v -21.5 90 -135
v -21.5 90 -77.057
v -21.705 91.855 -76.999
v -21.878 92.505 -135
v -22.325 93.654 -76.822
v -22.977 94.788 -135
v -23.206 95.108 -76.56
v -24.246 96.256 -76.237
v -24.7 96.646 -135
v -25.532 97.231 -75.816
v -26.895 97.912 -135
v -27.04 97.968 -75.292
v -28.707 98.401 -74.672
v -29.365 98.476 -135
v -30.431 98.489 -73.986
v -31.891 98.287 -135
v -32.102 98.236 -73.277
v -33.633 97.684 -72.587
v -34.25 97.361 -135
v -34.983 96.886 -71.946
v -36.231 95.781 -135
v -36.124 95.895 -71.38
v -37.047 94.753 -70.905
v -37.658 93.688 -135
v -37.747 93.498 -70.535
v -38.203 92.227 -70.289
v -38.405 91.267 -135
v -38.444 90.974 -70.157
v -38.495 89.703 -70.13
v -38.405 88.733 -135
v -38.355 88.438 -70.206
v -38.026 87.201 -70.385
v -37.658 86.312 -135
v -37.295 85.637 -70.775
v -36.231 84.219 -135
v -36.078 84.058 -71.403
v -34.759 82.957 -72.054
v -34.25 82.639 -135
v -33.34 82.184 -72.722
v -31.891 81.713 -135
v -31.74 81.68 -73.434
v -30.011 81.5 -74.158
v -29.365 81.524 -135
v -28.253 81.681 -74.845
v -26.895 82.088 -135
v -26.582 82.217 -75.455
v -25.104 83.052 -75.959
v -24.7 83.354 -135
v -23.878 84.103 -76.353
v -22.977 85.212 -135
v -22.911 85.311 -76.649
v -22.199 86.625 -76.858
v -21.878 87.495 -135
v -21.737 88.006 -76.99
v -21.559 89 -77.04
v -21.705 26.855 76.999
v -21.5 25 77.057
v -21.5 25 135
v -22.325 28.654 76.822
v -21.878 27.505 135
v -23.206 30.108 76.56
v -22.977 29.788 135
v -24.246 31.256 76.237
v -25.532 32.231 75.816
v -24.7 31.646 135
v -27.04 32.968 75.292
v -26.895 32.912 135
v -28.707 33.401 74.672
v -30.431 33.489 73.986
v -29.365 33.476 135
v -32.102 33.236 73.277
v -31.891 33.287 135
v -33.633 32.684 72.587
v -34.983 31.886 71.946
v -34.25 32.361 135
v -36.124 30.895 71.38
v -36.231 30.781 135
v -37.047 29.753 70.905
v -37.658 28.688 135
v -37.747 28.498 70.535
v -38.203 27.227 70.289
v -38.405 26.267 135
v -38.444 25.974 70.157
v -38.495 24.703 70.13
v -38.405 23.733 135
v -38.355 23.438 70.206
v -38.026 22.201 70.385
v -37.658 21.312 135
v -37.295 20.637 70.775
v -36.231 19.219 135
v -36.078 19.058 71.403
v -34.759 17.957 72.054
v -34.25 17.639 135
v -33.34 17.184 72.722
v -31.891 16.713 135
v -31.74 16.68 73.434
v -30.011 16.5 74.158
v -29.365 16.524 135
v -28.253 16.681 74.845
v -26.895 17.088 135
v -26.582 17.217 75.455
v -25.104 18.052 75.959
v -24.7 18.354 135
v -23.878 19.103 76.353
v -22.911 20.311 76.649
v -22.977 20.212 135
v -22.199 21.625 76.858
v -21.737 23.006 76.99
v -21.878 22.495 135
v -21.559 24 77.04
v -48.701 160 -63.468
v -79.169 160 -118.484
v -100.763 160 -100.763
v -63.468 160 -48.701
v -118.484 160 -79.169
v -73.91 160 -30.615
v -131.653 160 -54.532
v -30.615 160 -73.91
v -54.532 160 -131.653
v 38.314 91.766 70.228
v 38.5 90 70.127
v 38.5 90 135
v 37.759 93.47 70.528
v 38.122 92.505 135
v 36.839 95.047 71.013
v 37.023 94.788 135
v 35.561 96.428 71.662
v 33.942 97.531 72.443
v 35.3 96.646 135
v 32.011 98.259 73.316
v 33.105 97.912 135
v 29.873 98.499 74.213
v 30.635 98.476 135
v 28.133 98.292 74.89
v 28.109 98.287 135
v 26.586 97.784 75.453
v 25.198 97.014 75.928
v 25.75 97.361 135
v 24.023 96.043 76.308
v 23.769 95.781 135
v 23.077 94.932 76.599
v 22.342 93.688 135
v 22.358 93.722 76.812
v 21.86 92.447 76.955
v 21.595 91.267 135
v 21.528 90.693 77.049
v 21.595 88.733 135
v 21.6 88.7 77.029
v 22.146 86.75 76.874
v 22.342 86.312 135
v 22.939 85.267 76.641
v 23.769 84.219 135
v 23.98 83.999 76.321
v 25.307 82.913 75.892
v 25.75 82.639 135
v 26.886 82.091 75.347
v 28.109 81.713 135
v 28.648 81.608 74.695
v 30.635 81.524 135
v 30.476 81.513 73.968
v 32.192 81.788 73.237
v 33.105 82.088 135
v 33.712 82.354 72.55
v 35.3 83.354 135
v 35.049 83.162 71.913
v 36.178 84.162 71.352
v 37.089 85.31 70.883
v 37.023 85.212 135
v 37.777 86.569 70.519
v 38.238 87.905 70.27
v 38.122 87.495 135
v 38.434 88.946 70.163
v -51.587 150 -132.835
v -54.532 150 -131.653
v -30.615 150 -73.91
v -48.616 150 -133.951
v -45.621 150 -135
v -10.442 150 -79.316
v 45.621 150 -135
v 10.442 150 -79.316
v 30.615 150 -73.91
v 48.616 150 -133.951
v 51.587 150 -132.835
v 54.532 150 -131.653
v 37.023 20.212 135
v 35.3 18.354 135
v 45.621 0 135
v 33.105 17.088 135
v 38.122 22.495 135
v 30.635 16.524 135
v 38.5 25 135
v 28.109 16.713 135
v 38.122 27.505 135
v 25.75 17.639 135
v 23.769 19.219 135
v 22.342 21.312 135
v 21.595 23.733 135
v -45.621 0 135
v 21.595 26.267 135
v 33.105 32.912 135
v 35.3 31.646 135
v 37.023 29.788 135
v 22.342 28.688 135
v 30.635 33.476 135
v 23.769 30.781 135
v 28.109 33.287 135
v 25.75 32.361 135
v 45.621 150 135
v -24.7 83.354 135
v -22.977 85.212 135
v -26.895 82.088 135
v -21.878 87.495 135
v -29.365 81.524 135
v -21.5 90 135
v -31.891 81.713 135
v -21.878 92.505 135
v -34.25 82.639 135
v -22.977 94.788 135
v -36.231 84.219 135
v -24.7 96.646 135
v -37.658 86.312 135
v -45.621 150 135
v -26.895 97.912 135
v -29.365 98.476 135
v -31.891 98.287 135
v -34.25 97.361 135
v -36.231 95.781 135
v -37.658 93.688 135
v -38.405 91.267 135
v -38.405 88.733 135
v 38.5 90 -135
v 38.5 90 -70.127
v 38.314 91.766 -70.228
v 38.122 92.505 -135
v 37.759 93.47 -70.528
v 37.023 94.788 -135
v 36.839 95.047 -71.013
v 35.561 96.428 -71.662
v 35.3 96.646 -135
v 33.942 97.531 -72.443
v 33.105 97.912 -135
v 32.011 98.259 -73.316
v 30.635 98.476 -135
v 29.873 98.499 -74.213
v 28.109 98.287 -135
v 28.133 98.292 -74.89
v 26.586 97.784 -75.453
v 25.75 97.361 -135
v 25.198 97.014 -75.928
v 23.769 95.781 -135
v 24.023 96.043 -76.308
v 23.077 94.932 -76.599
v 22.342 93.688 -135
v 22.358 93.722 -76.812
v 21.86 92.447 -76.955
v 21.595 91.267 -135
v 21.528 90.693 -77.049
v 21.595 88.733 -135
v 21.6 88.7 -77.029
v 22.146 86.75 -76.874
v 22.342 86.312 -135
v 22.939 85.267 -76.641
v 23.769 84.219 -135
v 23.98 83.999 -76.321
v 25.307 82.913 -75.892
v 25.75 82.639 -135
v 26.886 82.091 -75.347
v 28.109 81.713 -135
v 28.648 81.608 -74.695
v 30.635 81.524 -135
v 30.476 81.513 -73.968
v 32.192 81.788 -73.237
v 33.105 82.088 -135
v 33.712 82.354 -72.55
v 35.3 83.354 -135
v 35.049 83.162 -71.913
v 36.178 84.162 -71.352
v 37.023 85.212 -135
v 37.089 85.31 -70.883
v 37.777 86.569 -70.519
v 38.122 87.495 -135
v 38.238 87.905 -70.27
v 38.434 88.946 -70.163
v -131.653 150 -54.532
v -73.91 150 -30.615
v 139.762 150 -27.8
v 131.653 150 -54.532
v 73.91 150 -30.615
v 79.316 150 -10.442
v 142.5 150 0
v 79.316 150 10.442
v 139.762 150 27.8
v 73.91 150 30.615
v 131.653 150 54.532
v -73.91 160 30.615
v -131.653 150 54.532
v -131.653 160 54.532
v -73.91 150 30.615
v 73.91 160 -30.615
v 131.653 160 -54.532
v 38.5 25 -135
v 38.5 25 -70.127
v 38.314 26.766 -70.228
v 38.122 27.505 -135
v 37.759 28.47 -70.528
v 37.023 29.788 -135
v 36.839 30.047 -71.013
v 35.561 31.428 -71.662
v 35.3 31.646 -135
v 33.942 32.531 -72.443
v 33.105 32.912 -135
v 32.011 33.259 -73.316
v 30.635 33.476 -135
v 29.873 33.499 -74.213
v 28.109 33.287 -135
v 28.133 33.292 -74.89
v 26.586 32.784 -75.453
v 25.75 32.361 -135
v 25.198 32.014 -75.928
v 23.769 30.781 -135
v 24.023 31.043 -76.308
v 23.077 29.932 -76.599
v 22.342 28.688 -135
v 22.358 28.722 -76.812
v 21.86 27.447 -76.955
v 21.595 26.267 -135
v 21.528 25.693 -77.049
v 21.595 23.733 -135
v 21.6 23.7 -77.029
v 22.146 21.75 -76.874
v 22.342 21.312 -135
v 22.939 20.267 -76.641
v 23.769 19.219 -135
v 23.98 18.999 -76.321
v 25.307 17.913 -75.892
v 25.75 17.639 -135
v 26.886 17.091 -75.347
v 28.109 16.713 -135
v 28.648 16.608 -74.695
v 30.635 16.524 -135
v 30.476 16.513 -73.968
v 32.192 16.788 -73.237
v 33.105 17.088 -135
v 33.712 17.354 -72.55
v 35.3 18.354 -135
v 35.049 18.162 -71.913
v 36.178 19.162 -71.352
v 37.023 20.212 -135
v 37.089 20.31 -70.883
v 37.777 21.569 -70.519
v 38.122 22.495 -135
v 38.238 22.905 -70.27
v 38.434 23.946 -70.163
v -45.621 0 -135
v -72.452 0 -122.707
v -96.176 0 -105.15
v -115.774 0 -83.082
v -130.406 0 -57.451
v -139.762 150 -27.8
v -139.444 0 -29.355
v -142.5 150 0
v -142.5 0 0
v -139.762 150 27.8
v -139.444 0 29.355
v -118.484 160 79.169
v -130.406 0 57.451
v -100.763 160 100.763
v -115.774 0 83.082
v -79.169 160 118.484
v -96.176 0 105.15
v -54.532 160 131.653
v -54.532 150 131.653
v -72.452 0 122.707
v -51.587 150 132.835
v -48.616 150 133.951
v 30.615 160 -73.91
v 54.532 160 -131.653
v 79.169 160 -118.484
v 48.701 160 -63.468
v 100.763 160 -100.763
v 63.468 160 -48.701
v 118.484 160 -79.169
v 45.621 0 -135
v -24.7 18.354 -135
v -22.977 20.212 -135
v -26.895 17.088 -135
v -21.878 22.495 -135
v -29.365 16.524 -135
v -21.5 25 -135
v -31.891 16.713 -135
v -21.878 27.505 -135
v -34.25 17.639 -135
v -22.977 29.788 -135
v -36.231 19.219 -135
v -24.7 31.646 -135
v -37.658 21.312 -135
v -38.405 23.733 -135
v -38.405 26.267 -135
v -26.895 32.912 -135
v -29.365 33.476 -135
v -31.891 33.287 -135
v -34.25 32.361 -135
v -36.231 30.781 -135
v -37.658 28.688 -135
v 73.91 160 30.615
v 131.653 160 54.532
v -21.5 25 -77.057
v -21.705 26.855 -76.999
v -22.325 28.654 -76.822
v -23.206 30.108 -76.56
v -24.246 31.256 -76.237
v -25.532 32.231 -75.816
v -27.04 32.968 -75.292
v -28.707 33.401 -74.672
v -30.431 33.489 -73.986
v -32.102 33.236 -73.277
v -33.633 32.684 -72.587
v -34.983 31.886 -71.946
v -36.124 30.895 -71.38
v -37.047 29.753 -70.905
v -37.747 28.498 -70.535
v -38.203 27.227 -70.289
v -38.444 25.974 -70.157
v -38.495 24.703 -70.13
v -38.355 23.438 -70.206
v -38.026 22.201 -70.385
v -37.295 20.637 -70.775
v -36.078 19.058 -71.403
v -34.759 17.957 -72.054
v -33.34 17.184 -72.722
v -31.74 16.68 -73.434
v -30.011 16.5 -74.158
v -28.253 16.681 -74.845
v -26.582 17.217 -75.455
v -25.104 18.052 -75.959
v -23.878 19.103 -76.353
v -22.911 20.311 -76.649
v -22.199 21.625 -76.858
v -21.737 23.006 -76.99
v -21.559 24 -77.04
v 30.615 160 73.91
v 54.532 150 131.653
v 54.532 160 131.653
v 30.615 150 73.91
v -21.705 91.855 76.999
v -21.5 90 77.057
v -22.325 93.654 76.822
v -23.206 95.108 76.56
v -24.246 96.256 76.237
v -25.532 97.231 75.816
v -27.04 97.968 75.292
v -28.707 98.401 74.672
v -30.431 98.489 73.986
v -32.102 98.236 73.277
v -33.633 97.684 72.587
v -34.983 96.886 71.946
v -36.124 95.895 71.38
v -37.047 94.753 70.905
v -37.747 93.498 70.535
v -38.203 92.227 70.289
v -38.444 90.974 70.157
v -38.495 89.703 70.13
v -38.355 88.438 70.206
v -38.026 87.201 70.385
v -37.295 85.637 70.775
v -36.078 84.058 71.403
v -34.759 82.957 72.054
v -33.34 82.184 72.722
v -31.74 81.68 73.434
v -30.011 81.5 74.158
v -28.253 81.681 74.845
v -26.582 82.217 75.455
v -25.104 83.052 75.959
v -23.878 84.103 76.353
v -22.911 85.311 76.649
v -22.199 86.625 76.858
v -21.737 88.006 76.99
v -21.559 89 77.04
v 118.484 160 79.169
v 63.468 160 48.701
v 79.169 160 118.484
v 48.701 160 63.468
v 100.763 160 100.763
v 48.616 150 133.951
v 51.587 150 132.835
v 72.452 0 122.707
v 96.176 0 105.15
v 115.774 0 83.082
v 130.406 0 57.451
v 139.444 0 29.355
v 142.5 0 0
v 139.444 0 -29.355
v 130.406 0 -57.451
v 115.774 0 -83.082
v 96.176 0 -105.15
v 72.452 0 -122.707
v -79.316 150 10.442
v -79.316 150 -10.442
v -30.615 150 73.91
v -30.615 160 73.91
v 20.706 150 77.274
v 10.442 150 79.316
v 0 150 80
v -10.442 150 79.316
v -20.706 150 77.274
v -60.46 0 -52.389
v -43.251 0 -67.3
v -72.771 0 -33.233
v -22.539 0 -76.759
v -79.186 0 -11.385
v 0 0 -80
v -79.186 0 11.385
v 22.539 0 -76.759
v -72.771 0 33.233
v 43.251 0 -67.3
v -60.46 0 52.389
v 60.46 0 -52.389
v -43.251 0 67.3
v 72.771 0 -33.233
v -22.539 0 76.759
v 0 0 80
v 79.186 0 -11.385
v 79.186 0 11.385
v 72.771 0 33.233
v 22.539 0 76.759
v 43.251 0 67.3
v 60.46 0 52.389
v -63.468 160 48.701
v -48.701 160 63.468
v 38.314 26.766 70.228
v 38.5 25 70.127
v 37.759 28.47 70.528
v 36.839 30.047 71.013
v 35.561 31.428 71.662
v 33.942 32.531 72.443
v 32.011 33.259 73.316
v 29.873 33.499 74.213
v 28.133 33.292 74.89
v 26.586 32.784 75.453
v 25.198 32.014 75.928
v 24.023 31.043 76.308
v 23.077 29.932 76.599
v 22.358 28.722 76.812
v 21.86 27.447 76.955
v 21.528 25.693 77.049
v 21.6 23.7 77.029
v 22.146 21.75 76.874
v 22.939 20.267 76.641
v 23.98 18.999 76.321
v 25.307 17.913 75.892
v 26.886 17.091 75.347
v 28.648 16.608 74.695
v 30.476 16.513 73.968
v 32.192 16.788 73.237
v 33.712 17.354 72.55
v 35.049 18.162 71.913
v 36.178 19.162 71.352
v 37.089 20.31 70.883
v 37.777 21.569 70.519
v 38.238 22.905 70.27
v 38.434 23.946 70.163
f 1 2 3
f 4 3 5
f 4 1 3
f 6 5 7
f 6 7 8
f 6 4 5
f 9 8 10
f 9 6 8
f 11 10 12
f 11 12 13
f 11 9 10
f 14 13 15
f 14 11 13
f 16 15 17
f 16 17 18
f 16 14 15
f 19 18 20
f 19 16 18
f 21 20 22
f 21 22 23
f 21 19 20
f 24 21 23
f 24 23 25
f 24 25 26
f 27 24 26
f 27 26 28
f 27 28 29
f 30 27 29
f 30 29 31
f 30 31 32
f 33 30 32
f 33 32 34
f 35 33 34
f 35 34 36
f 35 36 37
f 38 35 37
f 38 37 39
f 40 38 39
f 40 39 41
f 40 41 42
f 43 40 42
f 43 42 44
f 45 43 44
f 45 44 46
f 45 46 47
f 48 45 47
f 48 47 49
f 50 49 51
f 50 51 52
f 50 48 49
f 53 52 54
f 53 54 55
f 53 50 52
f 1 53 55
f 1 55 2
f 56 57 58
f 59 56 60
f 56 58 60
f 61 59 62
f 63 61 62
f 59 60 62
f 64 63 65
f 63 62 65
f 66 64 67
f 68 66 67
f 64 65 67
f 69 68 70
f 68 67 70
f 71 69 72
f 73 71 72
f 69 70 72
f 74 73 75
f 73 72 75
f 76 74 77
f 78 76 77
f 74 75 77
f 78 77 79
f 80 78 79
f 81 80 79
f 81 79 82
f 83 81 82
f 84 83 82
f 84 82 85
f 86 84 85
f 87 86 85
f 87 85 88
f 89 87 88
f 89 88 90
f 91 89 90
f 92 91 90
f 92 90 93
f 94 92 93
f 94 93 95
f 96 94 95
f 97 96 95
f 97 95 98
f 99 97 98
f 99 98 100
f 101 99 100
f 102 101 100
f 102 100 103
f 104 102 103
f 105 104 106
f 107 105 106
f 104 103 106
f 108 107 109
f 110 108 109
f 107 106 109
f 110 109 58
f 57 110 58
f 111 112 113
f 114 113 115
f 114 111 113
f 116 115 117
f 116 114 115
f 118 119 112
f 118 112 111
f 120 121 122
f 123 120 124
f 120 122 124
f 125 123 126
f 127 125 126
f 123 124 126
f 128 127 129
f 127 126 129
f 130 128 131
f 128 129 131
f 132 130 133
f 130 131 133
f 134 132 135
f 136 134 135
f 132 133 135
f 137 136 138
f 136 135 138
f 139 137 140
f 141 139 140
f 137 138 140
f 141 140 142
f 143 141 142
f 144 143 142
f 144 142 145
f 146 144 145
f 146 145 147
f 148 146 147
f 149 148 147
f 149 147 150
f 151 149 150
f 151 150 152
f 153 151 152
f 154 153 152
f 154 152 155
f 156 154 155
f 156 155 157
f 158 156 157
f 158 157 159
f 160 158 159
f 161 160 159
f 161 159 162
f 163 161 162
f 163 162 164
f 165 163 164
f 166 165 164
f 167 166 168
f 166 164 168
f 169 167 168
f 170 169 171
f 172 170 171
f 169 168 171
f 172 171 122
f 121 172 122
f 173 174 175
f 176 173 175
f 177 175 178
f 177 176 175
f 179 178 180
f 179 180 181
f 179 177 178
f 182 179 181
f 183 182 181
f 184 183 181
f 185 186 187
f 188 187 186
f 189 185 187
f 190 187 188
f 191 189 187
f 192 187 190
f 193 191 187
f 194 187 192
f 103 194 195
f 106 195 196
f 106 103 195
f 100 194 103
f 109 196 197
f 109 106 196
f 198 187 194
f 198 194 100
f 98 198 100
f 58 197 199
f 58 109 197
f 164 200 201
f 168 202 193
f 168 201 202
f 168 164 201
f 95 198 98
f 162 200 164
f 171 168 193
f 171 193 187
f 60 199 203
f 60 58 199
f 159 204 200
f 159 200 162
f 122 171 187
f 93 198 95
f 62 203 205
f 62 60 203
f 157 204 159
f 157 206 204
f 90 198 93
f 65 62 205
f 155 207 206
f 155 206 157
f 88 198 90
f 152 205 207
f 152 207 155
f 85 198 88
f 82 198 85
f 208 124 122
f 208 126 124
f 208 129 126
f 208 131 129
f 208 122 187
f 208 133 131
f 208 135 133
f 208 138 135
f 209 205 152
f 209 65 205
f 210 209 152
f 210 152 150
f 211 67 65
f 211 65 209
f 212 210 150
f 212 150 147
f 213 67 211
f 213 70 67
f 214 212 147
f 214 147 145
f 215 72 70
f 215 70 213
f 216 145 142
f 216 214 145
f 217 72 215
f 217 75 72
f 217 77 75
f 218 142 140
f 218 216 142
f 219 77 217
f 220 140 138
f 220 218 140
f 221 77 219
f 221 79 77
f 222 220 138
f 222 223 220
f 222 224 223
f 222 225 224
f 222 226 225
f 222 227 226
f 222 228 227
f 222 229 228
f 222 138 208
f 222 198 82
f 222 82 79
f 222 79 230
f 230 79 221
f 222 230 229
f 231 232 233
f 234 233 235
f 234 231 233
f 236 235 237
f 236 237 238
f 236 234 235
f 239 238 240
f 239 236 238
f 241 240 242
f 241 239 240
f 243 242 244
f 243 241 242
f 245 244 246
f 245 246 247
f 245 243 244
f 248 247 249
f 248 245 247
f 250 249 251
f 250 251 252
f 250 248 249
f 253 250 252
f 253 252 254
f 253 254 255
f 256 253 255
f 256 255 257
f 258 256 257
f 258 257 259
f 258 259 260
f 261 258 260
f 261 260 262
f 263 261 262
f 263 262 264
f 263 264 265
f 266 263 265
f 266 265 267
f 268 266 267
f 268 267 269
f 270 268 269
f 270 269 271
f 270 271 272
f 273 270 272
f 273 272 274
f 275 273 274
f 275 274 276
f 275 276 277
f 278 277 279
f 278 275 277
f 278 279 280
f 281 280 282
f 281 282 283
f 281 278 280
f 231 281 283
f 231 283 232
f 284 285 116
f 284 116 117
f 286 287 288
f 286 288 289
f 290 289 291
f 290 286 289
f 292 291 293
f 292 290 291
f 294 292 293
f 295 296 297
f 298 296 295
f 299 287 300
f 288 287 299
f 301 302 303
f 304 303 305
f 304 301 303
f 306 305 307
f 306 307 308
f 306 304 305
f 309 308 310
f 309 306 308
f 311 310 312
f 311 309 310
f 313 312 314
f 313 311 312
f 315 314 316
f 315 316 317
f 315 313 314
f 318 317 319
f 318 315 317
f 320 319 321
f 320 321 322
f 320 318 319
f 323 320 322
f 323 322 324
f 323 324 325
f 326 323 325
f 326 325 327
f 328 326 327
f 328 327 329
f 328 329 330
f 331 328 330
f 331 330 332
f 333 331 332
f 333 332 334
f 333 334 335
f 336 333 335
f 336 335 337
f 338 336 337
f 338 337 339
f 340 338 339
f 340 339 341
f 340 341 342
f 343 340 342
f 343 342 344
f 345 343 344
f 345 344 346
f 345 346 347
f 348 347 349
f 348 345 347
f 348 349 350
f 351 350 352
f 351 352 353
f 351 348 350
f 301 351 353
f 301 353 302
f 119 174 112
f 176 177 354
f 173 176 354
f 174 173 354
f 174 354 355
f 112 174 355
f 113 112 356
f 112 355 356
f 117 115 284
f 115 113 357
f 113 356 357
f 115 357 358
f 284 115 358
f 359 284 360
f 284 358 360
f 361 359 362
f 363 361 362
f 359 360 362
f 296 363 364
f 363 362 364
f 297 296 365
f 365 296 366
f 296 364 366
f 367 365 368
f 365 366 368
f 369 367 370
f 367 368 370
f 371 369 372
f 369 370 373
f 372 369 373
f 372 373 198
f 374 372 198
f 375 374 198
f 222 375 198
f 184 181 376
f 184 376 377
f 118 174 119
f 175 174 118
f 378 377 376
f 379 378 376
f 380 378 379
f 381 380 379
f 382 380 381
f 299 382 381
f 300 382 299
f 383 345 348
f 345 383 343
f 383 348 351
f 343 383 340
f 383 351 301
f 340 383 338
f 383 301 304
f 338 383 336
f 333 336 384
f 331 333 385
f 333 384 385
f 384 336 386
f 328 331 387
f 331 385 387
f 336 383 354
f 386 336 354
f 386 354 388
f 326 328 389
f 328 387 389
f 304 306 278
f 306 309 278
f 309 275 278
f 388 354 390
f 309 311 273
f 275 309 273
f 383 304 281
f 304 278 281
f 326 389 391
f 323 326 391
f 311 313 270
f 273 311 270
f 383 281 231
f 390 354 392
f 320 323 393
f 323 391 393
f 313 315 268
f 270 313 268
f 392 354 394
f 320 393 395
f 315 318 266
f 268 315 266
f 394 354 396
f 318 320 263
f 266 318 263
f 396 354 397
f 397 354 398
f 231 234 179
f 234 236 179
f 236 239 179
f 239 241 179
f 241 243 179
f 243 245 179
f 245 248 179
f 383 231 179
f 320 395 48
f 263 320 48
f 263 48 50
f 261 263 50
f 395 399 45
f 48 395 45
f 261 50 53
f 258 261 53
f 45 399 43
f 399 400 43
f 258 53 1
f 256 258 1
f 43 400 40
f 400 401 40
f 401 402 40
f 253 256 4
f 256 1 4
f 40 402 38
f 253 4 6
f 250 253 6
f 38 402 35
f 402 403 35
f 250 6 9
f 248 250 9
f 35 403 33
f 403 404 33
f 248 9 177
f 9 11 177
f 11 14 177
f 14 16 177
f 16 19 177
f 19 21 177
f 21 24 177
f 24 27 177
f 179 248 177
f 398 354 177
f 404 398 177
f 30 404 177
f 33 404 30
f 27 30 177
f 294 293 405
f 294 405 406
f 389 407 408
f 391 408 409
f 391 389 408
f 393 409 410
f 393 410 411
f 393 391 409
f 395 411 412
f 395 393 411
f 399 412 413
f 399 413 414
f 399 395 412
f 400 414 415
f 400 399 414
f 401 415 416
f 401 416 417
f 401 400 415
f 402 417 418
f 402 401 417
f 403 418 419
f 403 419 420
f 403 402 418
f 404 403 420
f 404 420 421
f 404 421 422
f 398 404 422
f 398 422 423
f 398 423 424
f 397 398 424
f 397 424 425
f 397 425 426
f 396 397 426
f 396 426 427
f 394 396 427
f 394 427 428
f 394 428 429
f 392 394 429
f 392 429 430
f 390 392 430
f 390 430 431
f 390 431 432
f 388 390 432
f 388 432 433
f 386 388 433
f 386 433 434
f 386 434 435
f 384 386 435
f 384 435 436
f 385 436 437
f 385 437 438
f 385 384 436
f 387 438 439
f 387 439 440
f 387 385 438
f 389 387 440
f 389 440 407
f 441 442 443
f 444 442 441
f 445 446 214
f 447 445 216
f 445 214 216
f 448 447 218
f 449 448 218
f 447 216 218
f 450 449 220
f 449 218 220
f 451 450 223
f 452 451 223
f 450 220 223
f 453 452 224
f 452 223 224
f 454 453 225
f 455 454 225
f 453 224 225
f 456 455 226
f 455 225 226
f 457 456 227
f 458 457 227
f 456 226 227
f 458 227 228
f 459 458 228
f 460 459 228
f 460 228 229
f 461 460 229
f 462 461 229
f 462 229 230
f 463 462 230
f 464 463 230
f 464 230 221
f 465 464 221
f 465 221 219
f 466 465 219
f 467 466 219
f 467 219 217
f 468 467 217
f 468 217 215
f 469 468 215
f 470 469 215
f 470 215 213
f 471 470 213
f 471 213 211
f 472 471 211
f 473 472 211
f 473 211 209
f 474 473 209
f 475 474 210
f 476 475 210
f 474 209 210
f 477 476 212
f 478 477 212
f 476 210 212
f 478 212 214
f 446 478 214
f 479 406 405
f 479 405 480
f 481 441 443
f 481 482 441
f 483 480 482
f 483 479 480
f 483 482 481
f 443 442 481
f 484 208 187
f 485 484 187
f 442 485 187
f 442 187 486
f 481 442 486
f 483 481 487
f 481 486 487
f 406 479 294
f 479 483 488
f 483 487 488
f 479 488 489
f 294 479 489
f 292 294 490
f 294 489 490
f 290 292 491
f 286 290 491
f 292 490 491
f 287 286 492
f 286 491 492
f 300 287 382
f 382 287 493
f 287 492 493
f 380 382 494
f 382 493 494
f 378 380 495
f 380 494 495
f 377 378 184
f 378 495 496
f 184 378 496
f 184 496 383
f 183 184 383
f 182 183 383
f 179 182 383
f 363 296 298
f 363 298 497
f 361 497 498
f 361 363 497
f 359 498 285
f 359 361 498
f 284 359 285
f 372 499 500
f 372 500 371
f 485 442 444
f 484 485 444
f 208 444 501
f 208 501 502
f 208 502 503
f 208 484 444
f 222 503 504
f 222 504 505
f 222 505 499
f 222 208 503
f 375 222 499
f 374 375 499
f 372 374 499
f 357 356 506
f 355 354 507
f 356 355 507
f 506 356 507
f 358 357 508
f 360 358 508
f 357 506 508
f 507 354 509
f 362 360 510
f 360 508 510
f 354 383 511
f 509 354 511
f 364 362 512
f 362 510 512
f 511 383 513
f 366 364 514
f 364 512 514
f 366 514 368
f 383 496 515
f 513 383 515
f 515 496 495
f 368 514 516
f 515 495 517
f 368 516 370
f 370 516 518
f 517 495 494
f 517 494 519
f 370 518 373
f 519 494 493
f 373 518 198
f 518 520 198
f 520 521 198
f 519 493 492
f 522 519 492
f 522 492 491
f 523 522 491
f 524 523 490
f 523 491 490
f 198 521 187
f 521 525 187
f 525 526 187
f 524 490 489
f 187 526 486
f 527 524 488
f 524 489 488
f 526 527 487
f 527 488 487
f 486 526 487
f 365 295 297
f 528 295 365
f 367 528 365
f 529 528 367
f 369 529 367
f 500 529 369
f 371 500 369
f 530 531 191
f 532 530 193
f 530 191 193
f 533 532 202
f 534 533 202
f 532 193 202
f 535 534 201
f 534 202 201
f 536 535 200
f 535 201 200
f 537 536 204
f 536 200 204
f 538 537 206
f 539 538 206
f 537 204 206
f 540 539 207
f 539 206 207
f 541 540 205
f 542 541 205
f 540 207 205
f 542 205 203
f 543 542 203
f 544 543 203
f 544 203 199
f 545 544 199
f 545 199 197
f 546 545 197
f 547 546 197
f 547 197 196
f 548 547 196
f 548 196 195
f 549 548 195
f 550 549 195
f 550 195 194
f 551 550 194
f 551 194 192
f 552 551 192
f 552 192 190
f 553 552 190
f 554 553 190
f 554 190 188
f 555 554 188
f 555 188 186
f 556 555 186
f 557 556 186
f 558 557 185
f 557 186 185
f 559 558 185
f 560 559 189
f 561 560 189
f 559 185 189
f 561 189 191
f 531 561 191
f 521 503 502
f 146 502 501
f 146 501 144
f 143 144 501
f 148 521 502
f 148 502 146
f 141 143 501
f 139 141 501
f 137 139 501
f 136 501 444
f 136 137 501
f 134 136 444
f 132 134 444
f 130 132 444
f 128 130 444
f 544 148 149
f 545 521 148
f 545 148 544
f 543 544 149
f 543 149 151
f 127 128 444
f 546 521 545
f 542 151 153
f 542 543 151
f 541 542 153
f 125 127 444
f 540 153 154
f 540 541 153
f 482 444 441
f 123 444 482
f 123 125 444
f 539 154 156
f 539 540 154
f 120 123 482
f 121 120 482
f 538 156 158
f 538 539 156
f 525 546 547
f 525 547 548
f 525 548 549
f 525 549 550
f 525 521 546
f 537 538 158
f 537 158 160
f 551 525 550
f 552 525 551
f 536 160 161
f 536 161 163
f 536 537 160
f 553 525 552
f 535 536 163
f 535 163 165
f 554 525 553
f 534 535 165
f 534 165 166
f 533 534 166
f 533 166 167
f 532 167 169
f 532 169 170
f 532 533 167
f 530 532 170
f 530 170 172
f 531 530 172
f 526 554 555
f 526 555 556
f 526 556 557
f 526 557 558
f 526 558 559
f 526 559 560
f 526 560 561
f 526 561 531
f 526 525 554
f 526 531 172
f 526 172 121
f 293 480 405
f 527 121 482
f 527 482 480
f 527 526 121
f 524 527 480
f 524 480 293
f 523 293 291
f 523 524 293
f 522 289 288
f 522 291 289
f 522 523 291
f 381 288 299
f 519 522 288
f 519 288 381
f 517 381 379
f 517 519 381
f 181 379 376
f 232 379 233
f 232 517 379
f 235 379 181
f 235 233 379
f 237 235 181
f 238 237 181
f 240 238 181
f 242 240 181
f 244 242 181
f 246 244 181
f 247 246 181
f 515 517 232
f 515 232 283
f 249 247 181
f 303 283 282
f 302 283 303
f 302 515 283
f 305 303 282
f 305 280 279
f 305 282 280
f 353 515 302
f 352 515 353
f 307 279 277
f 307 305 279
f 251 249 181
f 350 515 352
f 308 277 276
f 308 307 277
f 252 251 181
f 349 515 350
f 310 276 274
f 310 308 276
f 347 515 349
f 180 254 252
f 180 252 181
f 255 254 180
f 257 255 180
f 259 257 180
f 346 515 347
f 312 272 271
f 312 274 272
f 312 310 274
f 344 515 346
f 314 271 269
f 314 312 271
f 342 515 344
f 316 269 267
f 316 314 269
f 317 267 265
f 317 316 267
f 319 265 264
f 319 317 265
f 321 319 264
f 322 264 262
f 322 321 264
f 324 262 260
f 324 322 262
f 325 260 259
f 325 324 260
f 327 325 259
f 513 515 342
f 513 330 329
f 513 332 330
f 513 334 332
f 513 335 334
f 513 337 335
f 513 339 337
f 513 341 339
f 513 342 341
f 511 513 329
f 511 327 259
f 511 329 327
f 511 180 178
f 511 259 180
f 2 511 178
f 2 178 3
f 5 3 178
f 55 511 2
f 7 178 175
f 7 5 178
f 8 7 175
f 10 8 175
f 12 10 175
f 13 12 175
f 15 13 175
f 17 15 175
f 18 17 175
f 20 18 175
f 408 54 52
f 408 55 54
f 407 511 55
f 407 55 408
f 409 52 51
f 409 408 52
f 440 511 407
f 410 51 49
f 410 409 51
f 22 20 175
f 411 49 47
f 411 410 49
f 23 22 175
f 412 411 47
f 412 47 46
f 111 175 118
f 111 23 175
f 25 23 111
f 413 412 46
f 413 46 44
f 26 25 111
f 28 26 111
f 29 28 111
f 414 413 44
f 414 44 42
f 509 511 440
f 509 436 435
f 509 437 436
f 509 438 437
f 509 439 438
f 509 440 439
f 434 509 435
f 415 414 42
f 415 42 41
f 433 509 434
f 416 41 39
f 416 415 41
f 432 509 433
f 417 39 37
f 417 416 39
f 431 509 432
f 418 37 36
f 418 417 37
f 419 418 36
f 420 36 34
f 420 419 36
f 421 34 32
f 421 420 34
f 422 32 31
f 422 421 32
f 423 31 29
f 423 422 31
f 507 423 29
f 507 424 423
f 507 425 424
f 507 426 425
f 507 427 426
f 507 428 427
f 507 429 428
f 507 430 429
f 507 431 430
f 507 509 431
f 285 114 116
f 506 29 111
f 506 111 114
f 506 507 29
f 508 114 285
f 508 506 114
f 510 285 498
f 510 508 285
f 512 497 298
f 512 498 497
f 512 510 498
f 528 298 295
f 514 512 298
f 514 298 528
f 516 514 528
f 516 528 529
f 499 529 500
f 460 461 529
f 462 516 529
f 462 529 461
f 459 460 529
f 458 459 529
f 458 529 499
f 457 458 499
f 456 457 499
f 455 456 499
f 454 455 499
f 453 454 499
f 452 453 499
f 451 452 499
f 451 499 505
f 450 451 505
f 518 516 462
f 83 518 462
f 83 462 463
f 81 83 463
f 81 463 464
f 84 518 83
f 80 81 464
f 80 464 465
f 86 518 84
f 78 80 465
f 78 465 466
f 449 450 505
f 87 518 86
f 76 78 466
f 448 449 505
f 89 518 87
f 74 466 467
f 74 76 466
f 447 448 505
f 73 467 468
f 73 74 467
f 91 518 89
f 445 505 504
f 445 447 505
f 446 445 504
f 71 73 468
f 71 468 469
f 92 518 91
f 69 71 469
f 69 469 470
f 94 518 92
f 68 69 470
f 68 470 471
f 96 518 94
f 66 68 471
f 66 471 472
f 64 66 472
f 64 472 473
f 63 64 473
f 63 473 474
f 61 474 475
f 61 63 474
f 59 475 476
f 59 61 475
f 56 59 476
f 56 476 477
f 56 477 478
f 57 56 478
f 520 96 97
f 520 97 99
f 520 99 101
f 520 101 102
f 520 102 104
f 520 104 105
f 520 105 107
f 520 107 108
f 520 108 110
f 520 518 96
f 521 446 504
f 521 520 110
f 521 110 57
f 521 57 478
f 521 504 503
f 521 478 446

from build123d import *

# Parameters (mm, degrees)
SKETCH_1_R               = 142.5
SKETCH_1_R_2             = 80
EXTRUDE_1_DEPTH          = 160
CUT_EXTRUDE_START        = -10
CUT_EXTRUDE_1_DEPTH      = 10
PATTERN_CIRCULAR_1_COUNT = 4
CUT_EXTRUDE_2_DEPTH      = 258.317896774
CUT_EXTRUDE_2_DEPTH_BACK = 258.317896774
SKETCH_3_W               = 17.844530797
SKETCH_3_H               = 166.856843943
SKETCH_3_W_2             = 22.841371227
CUT_EXTRUDE_3_REACH      = 346.683
CUT_EXTRUDE_3_END_RADIUS = 80
SKETCH_4_R               = 8.5


with BuildPart() as part:
    # 草图1 → 凸台-拉伸1 (new body)
    with BuildSketch(Plane(origin=(0, 0, 0), x_dir=(1, 0, 0), z_dir=(0, 1, 0))):
        with Locations(Location((0, 0, 0), (0, 0, 270))):
            Circle(SKETCH_1_R)
        with Locations(Location((0, 0, 0), (0, 0, 270))):
            Circle(SKETCH_1_R_2, mode=Mode.SUBTRACT)
    extrude(amount=EXTRUDE_1_DEPTH)

    # 草图2 → 切除-拉伸1 (cut)
    with BuildSketch(Plane(origin=(0, 160, 0), x_dir=(1, 0, 0), z_dir=(0, 1, 0)).offset(CUT_EXTRUDE_START)):
        with BuildLine():
            Line((-54.532389112, 131.652833383), (-30.614674589, 73.910362601))
            ThreePointArc((-30.614674589, 73.910362601), (0, 80), (30.614674589, 73.910362601))
            Line((30.614674589, 73.910362601), (54.532389112, 131.652833383))
            ThreePointArc((54.532389112, 131.652833383), (0, 142.5), (-54.532389112, 131.652833383))
        make_face()
    cut_extrude_1 = extrude(amount=CUT_EXTRUDE_1_DEPTH, mode=Mode.SUBTRACT)

    # 阵列(圆周)1: 切除-拉伸1 ×4 about axis
    pattern_circular_1_axis = Axis((0, 160, 0), (0, -1, 0))
    for i in range(1, PATTERN_CIRCULAR_1_COUNT):
        add(cut_extrude_1.rotate(pattern_circular_1_axis, i * 360 / PATTERN_CIRCULAR_1_COUNT), mode=Mode.SUBTRACT)

    # 草图3 → 切除-拉伸2 (cut, two sides: drawn at the far end of the back side and taken through both)
    with BuildSketch(Plane(origin=(0, 0, 0), x_dir=(0, 0, -1), z_dir=(1, 0, 0)).offset(-CUT_EXTRUDE_2_DEPTH_BACK)):
        with Locations((143.922265399, 83.428421972)):
            Rectangle(SKETCH_3_W, SKETCH_3_H)
        with Locations((-146.420685613, 83.428421972)):
            Rectangle(SKETCH_3_W_2, SKETCH_3_H)
    extrude(amount=CUT_EXTRUDE_2_DEPTH + CUT_EXTRUDE_2_DEPTH_BACK, mode=Mode.SUBTRACT)

    # 切除-拉伸3: up to this cylinder (the profile starts outside it)
    cut_extrude_3_end = Plane(origin=(0, 57.5, 0), z_dir=(0, -1, 0)) * Cylinder(CUT_EXTRUDE_3_END_RADIUS, 919.366, mode=Mode.PRIVATE)
    # 草图4 → 切除-拉伸3 (cut, up to the surface)
    with BuildSketch(Plane.XY.offset(135), mode=Mode.PRIVATE) as cut_extrude_3_sk1:
        with Locations((-30, 90)):
            Circle(SKETCH_4_R)
    cut_extrude_3_tool1 = extrude(cut_extrude_3_sk1.sketch, amount=-CUT_EXTRUDE_3_REACH, mode=Mode.PRIVATE) - cut_extrude_3_end
    # 草图4 → 切除-拉伸3 (cut, up to the surface)
    with BuildSketch(Plane.XY.offset(135), mode=Mode.PRIVATE) as cut_extrude_3_sk2:
        with Locations((30, 90)):
            Circle(SKETCH_4_R)
    cut_extrude_3_tool2 = extrude(cut_extrude_3_sk2.sketch, amount=-CUT_EXTRUDE_3_REACH, mode=Mode.PRIVATE) - cut_extrude_3_end
    # 草图4 → 切除-拉伸3 (cut, up to the surface)
    with BuildSketch(Plane.XY.offset(135), mode=Mode.PRIVATE) as cut_extrude_3_sk3:
        with Locations((30, 25)):
            Circle(SKETCH_4_R)
    cut_extrude_3_tool3 = extrude(cut_extrude_3_sk3.sketch, amount=-CUT_EXTRUDE_3_REACH, mode=Mode.PRIVATE) - cut_extrude_3_end
    # 草图4 → 切除-拉伸3 (cut, up to the surface)
    with BuildSketch(Plane.XY.offset(135), mode=Mode.PRIVATE) as cut_extrude_3_sk4:
        with Locations((-30, 25)):
            Circle(SKETCH_4_R)
    cut_extrude_3_tool4 = extrude(cut_extrude_3_sk4.sketch, amount=-CUT_EXTRUDE_3_REACH, mode=Mode.PRIVATE) - cut_extrude_3_end
    cut_extrude_3 = cut_extrude_3_tool1.solids().sort_by_distance((-30, 90, 135))[0] + cut_extrude_3_tool2.solids().sort_by_distance((30, 90, 135))[0] + cut_extrude_3_tool3.solids().sort_by_distance((30, 25, 135))[0] + cut_extrude_3_tool4.solids().sort_by_distance((-30, 25, 135))[0]
    add(cut_extrude_3, mode=Mode.SUBTRACT)

    # 镜向1: 切除-拉伸3 across plane
    add(cut_extrude_3.mirror(Plane.XY), mode=Mode.SUBTRACT)


solid = part.part
